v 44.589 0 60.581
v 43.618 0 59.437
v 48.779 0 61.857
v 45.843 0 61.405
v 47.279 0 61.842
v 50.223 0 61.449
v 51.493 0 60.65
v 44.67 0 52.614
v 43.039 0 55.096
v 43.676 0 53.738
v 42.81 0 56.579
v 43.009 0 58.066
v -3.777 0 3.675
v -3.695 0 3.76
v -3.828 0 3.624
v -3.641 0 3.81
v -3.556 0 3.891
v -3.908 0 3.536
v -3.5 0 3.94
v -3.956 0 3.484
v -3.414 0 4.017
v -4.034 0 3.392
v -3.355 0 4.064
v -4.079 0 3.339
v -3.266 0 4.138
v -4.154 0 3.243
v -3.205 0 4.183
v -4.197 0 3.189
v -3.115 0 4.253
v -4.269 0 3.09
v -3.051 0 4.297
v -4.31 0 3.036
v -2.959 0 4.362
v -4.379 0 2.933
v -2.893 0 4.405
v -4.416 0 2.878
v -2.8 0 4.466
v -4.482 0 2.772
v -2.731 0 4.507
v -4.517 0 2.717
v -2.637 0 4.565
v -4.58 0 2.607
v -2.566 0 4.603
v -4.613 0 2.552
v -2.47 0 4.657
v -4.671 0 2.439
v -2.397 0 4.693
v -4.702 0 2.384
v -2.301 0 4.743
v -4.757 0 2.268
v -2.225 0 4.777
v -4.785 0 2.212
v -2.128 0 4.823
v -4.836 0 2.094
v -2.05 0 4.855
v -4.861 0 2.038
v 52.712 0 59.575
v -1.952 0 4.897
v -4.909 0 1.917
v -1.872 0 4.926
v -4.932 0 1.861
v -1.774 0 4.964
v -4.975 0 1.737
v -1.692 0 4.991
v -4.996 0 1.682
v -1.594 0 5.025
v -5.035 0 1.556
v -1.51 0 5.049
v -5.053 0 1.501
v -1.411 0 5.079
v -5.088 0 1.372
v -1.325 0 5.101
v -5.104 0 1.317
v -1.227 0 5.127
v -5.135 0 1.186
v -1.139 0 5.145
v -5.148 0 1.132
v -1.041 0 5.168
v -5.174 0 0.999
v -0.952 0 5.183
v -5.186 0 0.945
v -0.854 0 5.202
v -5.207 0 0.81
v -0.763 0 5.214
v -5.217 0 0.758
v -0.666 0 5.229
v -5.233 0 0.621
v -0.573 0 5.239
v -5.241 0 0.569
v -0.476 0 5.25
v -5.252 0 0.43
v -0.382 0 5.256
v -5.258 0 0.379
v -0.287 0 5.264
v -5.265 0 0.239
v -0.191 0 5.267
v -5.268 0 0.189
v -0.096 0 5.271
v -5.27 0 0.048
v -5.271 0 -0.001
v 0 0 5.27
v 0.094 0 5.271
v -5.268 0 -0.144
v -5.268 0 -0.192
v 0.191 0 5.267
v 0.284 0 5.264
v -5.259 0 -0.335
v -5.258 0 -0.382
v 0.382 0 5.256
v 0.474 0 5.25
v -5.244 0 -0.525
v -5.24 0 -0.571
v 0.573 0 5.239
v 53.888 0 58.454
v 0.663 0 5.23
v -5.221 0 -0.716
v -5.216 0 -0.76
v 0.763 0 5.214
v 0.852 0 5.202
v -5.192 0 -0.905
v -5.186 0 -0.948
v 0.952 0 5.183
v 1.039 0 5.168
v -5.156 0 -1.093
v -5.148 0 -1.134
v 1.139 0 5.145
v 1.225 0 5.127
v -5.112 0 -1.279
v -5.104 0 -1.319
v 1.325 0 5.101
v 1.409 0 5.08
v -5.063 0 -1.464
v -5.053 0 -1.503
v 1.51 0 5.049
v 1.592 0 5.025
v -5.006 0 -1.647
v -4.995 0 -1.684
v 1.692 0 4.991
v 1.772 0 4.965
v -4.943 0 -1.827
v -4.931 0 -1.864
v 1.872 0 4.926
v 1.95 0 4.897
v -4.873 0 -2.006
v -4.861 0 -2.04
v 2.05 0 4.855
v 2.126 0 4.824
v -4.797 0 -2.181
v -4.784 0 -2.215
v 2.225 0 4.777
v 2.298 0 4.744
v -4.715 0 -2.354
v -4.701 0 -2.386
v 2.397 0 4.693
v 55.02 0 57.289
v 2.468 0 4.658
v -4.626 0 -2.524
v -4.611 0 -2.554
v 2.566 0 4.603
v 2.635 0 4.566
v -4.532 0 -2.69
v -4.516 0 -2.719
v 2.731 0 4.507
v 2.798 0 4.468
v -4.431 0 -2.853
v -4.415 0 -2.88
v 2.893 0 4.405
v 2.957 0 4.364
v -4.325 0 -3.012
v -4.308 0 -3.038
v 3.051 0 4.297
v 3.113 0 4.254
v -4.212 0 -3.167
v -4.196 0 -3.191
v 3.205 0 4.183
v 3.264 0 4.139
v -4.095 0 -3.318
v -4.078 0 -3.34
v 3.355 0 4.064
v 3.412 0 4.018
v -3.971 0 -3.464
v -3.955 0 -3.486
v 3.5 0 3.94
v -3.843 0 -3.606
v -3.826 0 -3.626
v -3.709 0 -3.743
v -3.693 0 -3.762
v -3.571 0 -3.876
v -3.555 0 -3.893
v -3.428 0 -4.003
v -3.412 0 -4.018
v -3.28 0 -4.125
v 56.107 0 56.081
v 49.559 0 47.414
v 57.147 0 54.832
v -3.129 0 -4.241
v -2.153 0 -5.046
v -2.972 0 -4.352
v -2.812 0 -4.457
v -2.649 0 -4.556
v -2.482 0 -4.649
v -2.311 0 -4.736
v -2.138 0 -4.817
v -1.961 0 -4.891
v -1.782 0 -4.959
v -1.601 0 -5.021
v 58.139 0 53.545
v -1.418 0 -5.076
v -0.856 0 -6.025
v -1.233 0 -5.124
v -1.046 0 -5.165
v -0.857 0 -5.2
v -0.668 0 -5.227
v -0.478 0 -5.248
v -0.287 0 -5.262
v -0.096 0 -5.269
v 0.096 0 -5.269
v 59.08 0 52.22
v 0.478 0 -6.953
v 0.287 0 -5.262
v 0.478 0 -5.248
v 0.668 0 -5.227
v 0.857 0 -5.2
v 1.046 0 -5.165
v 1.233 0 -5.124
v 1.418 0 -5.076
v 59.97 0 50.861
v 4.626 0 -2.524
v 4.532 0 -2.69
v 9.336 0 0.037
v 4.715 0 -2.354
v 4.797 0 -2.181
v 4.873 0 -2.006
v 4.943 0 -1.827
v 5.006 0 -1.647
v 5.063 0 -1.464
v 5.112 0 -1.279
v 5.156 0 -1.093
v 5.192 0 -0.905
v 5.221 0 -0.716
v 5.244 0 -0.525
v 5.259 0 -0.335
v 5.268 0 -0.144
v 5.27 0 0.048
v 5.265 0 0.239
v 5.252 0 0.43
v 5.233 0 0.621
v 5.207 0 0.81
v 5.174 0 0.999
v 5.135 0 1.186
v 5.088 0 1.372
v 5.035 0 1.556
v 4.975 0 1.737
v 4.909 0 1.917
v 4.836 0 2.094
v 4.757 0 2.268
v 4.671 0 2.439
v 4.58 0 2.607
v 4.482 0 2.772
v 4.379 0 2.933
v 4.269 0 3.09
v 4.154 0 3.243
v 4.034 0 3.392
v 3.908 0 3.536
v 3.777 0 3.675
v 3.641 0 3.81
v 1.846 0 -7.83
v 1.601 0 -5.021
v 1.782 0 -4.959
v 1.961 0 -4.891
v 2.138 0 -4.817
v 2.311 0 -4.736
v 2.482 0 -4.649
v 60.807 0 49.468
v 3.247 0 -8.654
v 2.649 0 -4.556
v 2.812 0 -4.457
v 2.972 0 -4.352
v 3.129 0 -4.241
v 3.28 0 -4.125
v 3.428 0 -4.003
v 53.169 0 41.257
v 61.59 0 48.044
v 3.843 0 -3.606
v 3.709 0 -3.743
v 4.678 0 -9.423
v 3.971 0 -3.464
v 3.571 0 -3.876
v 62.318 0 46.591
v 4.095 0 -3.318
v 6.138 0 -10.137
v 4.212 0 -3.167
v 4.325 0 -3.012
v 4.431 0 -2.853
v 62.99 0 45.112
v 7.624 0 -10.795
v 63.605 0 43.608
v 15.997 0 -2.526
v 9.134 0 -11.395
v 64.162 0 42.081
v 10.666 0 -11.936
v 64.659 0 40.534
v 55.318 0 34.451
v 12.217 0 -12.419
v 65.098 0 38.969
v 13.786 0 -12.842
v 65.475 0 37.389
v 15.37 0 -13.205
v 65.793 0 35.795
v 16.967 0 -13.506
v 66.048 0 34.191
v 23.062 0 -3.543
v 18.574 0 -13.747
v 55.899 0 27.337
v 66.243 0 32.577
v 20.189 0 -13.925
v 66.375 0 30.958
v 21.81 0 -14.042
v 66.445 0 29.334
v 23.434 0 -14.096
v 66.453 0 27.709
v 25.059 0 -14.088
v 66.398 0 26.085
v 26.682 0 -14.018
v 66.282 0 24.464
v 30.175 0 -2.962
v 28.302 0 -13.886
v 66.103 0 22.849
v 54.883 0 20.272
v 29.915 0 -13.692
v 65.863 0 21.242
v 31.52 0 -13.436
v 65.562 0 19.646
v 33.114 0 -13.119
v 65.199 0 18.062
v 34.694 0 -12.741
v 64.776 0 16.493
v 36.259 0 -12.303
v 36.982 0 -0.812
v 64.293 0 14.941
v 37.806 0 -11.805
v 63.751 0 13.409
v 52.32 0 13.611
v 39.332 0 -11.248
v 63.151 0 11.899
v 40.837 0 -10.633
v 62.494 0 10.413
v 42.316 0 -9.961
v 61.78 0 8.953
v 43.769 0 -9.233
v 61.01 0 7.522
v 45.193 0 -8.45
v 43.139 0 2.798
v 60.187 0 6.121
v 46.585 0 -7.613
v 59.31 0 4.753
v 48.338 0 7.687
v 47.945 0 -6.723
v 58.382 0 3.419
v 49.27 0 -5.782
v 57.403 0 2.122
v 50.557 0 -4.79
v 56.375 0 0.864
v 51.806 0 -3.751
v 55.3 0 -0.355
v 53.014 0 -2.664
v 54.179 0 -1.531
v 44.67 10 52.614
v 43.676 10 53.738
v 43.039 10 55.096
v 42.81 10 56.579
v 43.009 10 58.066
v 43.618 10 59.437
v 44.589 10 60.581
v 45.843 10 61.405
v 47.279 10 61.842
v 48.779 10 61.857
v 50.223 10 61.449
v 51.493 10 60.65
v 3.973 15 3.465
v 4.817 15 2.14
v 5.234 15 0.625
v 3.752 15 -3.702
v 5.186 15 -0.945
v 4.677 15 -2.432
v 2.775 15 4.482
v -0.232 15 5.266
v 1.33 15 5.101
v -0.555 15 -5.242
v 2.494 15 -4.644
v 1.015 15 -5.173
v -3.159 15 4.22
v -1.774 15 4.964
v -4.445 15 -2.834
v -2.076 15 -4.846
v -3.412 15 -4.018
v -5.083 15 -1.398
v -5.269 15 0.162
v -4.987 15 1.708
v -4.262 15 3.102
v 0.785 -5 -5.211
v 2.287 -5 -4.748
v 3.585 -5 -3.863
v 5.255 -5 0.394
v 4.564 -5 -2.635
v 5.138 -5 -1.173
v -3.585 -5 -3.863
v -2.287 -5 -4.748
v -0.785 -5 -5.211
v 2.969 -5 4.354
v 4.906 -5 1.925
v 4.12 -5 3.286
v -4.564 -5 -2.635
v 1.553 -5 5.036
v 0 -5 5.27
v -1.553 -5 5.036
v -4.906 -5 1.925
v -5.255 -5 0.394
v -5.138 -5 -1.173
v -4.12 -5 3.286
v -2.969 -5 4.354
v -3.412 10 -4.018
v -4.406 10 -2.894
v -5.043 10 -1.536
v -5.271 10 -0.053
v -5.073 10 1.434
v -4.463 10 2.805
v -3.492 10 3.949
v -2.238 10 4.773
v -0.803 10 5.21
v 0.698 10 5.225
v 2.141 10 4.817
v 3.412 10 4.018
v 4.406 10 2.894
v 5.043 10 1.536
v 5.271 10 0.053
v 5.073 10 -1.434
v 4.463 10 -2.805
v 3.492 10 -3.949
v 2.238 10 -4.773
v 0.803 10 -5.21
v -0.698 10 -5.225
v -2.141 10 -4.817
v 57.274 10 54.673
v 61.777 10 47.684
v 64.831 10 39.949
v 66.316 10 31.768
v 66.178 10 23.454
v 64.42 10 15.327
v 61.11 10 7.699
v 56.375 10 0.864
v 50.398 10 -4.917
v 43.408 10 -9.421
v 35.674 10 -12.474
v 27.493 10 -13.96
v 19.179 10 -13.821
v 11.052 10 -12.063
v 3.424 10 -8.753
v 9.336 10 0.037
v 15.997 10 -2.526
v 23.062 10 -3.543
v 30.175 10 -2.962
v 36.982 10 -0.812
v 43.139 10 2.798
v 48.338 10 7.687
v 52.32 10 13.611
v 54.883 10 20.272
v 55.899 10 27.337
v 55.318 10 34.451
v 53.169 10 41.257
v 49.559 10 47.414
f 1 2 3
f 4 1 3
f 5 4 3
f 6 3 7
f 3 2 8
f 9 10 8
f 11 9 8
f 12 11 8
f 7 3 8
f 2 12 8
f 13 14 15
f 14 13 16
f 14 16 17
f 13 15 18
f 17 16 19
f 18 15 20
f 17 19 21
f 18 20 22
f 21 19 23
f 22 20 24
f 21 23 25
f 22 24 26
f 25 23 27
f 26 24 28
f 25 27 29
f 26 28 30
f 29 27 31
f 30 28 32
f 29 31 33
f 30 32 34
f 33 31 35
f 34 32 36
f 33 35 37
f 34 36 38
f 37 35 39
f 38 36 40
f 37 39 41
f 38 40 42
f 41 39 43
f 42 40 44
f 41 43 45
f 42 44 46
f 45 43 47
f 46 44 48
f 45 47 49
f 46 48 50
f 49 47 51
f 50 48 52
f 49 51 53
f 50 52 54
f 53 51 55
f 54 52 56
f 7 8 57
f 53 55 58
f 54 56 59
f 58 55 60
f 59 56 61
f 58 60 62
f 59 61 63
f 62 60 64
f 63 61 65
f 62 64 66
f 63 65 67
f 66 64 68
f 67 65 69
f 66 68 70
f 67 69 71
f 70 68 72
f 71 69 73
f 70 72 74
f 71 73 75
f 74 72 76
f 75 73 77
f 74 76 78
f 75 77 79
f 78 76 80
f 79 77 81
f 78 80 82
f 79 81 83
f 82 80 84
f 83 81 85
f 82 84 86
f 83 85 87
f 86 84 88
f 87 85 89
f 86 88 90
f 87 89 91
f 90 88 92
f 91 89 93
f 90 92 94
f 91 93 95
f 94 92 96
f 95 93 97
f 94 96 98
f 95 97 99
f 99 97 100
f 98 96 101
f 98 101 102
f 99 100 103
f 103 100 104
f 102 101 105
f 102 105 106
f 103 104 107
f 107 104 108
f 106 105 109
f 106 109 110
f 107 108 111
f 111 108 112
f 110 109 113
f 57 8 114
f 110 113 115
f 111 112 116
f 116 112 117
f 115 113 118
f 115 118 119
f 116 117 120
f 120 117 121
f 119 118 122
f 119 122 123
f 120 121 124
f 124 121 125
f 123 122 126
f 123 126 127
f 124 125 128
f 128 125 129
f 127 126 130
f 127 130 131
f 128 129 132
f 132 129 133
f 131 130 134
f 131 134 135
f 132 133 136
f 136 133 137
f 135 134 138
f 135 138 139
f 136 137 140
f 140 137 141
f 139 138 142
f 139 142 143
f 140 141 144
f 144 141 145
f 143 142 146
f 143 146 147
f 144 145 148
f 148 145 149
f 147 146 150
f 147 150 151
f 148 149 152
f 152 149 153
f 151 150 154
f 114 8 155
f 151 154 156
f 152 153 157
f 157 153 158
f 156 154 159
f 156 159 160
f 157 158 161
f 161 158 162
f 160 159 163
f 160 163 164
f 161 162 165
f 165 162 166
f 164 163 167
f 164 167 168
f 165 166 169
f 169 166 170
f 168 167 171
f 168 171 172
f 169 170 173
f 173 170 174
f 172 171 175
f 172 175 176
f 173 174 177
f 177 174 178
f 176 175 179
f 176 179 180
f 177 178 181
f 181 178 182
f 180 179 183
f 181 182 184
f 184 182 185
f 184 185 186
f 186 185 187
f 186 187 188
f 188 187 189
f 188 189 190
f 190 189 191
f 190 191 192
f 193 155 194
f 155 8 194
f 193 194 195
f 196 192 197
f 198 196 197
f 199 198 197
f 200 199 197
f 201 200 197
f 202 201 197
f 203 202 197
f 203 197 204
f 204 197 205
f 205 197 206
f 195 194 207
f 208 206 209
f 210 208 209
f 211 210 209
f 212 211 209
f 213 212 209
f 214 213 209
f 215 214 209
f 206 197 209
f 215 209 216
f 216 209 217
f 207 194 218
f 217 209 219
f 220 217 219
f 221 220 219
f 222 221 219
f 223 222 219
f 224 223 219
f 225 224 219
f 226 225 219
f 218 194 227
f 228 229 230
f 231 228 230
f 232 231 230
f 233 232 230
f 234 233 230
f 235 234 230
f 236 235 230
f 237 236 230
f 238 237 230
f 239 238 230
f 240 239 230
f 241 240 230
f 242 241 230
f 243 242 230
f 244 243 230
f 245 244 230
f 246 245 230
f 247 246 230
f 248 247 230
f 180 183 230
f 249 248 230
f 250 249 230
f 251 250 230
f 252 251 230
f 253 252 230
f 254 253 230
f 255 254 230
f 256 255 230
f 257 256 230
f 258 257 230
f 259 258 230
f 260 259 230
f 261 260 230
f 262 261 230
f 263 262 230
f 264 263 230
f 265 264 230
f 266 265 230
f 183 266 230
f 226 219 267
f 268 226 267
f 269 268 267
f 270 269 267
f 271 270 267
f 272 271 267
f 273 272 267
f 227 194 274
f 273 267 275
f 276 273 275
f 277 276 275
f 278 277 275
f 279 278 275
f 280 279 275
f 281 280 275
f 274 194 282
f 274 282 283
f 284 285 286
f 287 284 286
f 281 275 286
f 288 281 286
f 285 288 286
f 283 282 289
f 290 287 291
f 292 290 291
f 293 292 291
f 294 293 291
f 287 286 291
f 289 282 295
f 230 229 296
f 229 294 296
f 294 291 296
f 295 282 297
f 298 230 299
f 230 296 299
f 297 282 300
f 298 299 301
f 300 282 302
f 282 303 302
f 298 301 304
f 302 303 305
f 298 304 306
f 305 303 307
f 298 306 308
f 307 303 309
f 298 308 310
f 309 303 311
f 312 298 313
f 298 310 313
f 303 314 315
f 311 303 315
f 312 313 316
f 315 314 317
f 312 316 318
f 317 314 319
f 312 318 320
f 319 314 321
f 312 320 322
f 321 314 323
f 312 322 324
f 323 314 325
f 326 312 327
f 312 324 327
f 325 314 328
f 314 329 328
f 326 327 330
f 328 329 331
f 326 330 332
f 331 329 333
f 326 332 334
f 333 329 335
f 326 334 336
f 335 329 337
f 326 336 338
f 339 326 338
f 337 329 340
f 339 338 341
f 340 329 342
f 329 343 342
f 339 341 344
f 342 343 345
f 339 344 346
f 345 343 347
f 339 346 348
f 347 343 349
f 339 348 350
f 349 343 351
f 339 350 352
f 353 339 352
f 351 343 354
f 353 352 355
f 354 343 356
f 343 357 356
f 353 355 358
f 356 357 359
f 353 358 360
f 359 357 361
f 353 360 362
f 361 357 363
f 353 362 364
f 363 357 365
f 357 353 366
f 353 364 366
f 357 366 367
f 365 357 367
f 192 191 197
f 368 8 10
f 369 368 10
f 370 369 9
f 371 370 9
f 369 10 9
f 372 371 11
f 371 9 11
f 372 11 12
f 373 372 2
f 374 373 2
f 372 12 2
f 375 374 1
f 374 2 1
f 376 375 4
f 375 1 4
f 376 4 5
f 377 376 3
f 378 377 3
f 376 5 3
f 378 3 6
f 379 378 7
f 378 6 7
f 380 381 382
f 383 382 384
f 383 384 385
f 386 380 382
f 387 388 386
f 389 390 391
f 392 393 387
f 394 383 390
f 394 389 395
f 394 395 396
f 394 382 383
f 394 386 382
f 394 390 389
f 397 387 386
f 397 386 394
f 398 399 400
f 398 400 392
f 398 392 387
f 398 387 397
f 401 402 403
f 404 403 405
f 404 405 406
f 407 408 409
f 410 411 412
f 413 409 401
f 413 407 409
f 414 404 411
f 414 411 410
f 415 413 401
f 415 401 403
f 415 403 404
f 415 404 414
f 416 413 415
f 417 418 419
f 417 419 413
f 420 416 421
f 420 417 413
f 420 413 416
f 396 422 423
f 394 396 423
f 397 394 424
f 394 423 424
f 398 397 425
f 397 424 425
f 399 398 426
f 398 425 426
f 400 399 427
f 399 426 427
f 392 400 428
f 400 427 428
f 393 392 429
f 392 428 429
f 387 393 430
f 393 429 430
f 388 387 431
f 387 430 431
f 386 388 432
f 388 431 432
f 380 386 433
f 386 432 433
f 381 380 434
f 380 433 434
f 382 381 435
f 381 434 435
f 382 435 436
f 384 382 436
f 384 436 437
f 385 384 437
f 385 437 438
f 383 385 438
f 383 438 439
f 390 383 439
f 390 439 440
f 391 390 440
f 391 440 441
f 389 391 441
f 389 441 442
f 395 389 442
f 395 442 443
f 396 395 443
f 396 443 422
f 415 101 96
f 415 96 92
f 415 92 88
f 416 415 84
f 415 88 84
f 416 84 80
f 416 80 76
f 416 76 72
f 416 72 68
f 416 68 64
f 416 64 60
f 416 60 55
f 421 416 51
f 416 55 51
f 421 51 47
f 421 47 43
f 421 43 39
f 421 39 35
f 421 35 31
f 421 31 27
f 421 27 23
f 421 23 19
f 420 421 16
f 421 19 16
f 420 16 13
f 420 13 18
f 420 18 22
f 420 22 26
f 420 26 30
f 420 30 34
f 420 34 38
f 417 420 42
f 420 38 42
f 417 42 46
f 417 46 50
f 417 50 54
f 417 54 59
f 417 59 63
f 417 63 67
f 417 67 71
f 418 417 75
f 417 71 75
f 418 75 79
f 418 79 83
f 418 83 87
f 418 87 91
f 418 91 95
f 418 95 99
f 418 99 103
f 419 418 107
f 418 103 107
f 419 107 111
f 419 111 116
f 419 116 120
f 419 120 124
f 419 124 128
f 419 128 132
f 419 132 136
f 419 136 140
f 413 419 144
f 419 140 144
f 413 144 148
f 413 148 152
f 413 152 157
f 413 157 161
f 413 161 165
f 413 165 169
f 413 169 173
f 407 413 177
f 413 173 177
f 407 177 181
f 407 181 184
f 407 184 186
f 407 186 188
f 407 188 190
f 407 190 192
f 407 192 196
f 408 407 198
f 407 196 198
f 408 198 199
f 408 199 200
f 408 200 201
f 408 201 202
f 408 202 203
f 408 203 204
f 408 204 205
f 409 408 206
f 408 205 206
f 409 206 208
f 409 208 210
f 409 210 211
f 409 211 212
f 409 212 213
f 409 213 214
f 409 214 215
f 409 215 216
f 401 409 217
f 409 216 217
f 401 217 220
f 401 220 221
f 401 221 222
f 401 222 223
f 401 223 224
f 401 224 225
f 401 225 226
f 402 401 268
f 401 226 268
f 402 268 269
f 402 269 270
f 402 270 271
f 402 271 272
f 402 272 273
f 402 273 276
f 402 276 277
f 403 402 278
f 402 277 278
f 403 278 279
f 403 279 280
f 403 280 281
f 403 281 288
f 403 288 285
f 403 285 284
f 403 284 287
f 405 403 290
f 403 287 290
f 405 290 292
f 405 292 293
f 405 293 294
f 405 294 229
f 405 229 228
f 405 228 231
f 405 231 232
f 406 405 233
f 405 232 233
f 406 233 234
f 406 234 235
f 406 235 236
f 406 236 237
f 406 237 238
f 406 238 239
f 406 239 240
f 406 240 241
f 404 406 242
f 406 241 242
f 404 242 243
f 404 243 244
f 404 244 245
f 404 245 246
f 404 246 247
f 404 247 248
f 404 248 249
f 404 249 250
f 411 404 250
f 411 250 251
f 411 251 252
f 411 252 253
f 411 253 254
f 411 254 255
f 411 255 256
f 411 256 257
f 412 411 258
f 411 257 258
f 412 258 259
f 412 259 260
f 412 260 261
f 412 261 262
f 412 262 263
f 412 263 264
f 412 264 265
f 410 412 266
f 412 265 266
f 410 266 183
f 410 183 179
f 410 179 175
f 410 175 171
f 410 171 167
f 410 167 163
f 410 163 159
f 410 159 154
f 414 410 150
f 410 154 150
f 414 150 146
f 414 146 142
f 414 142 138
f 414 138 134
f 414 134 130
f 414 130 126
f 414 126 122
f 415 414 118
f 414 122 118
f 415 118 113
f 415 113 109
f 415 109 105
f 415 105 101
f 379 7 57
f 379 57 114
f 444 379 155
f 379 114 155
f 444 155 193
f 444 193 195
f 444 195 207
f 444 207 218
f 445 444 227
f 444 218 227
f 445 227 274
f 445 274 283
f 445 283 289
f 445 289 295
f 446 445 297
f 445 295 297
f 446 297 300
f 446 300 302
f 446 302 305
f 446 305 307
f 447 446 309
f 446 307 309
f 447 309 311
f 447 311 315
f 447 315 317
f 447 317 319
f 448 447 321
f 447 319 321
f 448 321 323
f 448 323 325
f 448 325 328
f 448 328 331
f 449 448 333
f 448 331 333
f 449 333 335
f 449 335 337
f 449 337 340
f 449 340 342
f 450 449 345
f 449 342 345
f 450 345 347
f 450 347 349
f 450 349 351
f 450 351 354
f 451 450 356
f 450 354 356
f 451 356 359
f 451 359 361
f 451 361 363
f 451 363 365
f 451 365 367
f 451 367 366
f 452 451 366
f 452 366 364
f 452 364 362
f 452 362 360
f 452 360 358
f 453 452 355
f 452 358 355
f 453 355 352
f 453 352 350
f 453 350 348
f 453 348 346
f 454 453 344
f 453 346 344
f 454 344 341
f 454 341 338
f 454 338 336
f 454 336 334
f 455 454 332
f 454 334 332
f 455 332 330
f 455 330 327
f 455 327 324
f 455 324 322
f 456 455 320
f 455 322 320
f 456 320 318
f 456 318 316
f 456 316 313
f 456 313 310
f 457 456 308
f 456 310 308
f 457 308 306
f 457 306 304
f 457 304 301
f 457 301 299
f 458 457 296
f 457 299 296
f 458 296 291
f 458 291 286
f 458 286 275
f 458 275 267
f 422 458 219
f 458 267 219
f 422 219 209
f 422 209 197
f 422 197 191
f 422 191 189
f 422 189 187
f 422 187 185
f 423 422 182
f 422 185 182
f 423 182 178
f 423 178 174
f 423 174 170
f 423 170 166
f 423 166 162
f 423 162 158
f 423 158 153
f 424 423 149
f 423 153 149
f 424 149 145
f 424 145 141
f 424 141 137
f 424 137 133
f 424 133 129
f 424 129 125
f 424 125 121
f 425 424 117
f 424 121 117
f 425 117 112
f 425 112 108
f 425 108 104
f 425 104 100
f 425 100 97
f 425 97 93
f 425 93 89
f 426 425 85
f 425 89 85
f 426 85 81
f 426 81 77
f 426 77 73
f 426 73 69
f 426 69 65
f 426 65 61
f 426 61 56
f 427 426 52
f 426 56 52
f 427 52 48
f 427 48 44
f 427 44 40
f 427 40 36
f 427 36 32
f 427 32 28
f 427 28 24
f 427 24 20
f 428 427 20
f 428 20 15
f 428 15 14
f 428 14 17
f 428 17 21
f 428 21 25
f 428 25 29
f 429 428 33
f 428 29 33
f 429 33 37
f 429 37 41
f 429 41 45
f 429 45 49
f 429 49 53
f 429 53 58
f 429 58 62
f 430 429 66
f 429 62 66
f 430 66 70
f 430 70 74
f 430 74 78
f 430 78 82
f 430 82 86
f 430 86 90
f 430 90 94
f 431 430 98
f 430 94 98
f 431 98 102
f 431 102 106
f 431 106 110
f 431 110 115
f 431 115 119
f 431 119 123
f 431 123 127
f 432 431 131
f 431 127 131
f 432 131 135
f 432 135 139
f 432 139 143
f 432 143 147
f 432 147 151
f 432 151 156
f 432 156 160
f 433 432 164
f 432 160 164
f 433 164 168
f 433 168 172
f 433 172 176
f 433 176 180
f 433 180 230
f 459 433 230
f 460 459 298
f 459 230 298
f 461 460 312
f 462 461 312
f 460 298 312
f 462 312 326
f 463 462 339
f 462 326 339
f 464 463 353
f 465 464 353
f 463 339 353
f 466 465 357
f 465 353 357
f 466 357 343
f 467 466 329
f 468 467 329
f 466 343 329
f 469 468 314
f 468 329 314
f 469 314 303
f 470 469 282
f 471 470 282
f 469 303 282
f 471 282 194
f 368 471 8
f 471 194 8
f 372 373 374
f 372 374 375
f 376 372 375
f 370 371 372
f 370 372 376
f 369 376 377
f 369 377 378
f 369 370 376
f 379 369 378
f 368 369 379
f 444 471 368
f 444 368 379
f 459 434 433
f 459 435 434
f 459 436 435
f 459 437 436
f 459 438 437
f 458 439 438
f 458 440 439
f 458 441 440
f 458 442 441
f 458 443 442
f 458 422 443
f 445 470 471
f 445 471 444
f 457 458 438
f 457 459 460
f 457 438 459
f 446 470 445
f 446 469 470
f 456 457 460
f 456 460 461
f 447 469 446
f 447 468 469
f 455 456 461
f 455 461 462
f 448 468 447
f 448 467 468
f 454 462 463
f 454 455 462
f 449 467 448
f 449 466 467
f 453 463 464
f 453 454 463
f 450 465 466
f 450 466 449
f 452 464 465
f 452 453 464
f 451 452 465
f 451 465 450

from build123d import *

# Parameters (mm, degrees)
BOSS_EXTRUDE2_DEPTH = 10
SKETCH5_R           = 5.271415538
BOSS_EXTRUDE3_DEPTH = 5
SKETCH8_R           = 5.27
BOSS_EXTRUDE4_DEPTH = 5


with BuildPart() as part:
    # Sketch4 → Boss-Extrude2 (new body)
    with BuildSketch(Plane(origin=(0, 0, 0), x_dir=(1, 0, 0), z_dir=(0, 1, 0))):
        with BuildLine():
            ThreePointArc((51.493202039, -60.650498275), (56.375212409, -0.863559663), (-3.411726203, 4.018450707))
            ThreePointArc((-3.411726203, 4.018450707), (-4.018450707, -3.411726203), (3.411726203, -4.018450707))
            ThreePointArc((3.411726203, -4.018450707), (48.338310994, -7.687012068), (44.669749634, -52.61359686))
            ThreePointArc((44.669749634, -52.61359686), (44.063025129, -60.04377377), (51.493202039, -60.650498275))
        make_face()
    extrude(amount=BOSS_EXTRUDE2_DEPTH)

    # Sketch5 → Boss-Extrude3 (add)
    with BuildSketch(Plane(origin=(0, 10, 0), x_dir=(1, 0, 0), z_dir=(0, 1, 0))):
        with Locations(Location((0, 0, 0), (0, 0, 130.331767004))):
            Circle(SKETCH5_R)
    extrude(amount=BOSS_EXTRUDE3_DEPTH)

    # Sketch8 → Boss-Extrude4 (add)
    with BuildSketch(Plane.XZ):
        with Locations(Location((0, 0, 0), (0, 0, 90))):
            Circle(SKETCH8_R)
    extrude(amount=BOSS_EXTRUDE4_DEPTH)


solid = part.part
